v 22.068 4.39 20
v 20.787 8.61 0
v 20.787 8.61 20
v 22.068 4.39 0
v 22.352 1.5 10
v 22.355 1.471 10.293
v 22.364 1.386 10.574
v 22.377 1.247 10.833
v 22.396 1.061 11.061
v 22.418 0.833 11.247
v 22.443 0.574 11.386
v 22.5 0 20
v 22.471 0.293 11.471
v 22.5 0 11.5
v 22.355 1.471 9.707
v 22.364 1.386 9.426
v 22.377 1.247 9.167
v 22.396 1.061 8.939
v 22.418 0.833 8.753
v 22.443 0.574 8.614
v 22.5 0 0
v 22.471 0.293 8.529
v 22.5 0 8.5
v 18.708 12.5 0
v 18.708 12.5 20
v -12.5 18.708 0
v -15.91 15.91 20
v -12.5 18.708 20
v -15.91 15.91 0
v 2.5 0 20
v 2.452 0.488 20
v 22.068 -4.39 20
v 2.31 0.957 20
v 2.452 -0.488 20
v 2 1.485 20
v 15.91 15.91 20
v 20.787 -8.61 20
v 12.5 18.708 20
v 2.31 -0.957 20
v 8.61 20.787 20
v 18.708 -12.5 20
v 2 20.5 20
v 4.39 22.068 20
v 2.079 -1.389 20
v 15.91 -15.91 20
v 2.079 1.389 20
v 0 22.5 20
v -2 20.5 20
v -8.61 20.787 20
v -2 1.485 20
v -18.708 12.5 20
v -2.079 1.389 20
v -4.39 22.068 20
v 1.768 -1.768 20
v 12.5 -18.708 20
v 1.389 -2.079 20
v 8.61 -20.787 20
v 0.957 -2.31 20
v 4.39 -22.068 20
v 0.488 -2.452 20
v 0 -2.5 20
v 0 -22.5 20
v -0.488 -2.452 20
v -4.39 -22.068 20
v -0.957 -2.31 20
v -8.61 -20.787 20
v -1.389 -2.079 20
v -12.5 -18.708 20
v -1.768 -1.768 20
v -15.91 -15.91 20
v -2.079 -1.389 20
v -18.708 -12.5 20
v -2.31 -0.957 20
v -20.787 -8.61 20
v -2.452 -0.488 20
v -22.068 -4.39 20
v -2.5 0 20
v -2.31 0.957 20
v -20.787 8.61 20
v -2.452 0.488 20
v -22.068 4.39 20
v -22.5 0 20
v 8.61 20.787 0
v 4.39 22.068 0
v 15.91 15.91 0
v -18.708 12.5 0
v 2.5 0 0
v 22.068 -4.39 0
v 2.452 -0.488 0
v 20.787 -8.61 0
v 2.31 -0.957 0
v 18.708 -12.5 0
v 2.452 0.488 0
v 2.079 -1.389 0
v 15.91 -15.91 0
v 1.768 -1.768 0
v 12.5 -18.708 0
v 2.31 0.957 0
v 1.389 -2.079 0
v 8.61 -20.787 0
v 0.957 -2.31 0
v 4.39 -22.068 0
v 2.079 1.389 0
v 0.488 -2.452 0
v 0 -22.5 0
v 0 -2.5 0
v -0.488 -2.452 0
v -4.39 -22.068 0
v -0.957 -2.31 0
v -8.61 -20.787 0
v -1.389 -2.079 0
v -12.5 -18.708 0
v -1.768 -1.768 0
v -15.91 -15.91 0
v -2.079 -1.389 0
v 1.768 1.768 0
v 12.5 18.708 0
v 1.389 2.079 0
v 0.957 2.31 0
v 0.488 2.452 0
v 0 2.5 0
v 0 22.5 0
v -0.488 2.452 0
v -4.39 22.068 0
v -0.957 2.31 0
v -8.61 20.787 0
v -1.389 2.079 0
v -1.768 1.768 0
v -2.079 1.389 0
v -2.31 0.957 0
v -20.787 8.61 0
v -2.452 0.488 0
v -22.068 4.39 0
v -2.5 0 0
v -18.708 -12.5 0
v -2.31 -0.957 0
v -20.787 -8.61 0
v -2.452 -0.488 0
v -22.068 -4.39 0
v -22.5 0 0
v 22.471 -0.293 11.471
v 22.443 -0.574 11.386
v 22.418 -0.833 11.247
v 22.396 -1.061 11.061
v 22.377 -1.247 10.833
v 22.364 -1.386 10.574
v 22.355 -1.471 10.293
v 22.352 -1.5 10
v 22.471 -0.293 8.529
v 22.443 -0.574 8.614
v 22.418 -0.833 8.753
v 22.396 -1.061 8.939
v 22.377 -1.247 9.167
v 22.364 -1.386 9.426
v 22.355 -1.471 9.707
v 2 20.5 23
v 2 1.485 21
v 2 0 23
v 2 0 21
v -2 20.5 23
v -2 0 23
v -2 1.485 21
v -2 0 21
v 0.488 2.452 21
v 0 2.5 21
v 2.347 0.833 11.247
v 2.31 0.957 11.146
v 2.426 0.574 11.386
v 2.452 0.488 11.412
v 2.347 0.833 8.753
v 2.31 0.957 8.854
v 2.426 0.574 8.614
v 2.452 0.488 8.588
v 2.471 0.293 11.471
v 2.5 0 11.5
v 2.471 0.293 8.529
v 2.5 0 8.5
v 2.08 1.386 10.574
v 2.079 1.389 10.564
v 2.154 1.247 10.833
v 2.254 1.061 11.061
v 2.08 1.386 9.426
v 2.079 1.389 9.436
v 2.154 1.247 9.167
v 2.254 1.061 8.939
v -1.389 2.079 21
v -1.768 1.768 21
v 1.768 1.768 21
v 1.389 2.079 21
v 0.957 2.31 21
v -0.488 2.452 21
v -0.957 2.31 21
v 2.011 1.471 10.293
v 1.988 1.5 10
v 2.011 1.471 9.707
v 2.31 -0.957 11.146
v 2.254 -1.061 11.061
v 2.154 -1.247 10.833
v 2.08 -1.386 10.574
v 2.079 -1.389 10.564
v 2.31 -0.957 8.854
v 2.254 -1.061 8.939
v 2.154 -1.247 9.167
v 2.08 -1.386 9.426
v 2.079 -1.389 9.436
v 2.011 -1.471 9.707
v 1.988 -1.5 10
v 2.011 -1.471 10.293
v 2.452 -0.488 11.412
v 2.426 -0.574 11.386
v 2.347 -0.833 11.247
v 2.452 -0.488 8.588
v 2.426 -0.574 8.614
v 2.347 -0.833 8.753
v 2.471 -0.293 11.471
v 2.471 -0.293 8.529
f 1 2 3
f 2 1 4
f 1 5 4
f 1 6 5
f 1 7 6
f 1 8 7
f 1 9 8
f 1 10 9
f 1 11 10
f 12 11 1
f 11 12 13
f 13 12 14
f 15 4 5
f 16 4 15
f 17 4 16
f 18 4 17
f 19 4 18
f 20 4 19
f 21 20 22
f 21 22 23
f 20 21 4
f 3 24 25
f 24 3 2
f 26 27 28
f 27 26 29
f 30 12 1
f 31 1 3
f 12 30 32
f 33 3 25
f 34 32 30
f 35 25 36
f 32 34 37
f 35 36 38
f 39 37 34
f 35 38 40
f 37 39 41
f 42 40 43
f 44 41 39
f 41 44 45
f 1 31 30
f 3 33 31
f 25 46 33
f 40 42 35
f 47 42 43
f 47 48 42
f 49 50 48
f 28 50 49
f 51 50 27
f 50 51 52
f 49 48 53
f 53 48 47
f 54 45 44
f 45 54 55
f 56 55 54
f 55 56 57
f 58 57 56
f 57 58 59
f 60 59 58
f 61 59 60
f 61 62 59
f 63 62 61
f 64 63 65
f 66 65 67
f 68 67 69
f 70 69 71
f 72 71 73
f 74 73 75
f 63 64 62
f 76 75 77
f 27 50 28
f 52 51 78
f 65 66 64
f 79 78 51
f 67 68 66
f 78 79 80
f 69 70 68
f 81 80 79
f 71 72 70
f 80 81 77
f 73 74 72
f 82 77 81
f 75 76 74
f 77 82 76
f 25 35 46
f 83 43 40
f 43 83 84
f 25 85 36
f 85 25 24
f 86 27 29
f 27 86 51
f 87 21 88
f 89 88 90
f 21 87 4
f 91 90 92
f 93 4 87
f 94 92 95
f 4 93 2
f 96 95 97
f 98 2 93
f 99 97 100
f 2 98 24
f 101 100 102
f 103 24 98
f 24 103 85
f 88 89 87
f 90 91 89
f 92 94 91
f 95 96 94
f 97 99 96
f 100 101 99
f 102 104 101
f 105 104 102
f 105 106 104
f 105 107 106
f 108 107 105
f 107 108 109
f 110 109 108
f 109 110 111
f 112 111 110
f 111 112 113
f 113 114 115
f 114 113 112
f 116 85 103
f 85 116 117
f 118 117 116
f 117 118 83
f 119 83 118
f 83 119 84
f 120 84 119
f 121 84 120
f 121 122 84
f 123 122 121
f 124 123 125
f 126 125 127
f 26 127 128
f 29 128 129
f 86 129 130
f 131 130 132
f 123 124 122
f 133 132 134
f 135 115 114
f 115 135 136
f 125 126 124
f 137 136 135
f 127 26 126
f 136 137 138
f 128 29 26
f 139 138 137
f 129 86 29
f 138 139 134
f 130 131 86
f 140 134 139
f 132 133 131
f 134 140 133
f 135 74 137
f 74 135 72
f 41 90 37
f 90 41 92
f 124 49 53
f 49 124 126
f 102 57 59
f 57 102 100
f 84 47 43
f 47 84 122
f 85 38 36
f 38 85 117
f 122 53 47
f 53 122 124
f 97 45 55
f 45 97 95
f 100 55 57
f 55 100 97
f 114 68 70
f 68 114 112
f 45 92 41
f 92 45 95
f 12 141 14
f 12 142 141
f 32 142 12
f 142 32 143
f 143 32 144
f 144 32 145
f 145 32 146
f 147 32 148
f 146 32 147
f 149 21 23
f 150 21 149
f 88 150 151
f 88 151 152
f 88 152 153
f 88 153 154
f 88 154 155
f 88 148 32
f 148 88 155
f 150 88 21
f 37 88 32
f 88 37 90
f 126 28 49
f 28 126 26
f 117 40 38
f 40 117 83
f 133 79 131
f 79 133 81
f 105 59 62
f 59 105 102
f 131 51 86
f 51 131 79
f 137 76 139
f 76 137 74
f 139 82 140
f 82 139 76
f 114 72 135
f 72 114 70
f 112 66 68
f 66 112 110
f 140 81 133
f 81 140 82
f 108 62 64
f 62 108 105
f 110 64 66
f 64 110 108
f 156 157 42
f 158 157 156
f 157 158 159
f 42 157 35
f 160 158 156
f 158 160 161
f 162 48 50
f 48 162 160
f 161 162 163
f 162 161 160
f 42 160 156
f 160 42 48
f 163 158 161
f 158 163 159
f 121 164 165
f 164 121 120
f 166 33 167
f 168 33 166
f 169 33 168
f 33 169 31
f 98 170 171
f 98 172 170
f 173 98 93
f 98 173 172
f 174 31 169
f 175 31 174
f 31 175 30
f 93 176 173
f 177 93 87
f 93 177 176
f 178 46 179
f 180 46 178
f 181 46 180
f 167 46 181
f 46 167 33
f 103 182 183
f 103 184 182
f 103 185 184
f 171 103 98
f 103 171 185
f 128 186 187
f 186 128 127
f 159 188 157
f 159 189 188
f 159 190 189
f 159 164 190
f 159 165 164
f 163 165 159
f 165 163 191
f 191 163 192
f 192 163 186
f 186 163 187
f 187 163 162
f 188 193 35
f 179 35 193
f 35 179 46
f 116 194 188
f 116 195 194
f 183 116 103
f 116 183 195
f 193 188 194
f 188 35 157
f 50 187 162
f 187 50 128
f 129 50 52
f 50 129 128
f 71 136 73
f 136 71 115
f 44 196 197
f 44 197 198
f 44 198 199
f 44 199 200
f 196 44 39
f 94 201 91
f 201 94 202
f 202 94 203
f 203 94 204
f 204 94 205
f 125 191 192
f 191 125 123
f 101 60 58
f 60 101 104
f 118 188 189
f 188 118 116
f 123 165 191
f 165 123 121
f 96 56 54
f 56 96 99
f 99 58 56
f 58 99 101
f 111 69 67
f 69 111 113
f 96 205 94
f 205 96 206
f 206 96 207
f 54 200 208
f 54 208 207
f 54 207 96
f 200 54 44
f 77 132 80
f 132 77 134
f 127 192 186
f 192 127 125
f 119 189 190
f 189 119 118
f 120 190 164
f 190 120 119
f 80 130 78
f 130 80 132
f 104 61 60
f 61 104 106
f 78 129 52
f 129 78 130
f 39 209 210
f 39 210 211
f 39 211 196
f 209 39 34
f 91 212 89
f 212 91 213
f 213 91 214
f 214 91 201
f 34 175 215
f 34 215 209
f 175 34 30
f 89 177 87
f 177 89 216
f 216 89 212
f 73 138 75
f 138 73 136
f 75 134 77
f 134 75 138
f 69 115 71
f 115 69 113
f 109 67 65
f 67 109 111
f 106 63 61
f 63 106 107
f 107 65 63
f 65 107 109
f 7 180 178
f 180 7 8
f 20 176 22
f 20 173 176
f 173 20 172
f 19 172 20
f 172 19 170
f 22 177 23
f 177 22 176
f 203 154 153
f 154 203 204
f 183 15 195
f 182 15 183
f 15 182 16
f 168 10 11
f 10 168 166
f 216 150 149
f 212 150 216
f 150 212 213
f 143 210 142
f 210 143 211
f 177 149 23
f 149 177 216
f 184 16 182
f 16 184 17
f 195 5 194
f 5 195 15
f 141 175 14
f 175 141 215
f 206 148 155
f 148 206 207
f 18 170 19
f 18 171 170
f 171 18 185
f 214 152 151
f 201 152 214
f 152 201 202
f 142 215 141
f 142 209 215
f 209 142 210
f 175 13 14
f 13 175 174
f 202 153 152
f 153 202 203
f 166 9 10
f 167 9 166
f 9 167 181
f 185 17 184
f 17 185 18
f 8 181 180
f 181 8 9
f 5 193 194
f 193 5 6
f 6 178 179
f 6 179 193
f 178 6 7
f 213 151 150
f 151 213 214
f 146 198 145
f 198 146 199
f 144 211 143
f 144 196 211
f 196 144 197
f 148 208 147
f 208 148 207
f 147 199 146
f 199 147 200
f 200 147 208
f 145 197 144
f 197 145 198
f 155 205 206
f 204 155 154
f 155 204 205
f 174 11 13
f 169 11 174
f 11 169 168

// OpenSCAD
$fn = 32;

// ----------------------------------------------------------------------
// Control knob: pointer knob
// ----------------------------------------------------------------------

// --- parameters (mm) ---
rib_w = 4;                // pointer rib width
rib_h = 4;                // pointer rib height
knob_d = 45;              // knob body diameter
knob_h = 20;              // knob body height
bore_d = 5;               // shaft bore diameter
set_d = 3;                // set screw bore diameter

rib_poke = rib_h - 1;  // rib height above the top
total_h = knob_h + rib_h - 1;  // overall height

difference() {
  union() {
    cylinder(h = knob_h, d = knob_d);
    translate([-rib_w / 2, 0, knob_h - 1])
      cube([rib_w, knob_d / 2 - 2, rib_h]);
  }
  translate([0, 0, -1]) cylinder(h = knob_h + 2, d = bore_d);
  translate([-1, 0, knob_h / 2]) rotate([0, 90, 0])
    cylinder(h = knob_d / 2 + bore_d / 2 + 2, d = set_d);}
